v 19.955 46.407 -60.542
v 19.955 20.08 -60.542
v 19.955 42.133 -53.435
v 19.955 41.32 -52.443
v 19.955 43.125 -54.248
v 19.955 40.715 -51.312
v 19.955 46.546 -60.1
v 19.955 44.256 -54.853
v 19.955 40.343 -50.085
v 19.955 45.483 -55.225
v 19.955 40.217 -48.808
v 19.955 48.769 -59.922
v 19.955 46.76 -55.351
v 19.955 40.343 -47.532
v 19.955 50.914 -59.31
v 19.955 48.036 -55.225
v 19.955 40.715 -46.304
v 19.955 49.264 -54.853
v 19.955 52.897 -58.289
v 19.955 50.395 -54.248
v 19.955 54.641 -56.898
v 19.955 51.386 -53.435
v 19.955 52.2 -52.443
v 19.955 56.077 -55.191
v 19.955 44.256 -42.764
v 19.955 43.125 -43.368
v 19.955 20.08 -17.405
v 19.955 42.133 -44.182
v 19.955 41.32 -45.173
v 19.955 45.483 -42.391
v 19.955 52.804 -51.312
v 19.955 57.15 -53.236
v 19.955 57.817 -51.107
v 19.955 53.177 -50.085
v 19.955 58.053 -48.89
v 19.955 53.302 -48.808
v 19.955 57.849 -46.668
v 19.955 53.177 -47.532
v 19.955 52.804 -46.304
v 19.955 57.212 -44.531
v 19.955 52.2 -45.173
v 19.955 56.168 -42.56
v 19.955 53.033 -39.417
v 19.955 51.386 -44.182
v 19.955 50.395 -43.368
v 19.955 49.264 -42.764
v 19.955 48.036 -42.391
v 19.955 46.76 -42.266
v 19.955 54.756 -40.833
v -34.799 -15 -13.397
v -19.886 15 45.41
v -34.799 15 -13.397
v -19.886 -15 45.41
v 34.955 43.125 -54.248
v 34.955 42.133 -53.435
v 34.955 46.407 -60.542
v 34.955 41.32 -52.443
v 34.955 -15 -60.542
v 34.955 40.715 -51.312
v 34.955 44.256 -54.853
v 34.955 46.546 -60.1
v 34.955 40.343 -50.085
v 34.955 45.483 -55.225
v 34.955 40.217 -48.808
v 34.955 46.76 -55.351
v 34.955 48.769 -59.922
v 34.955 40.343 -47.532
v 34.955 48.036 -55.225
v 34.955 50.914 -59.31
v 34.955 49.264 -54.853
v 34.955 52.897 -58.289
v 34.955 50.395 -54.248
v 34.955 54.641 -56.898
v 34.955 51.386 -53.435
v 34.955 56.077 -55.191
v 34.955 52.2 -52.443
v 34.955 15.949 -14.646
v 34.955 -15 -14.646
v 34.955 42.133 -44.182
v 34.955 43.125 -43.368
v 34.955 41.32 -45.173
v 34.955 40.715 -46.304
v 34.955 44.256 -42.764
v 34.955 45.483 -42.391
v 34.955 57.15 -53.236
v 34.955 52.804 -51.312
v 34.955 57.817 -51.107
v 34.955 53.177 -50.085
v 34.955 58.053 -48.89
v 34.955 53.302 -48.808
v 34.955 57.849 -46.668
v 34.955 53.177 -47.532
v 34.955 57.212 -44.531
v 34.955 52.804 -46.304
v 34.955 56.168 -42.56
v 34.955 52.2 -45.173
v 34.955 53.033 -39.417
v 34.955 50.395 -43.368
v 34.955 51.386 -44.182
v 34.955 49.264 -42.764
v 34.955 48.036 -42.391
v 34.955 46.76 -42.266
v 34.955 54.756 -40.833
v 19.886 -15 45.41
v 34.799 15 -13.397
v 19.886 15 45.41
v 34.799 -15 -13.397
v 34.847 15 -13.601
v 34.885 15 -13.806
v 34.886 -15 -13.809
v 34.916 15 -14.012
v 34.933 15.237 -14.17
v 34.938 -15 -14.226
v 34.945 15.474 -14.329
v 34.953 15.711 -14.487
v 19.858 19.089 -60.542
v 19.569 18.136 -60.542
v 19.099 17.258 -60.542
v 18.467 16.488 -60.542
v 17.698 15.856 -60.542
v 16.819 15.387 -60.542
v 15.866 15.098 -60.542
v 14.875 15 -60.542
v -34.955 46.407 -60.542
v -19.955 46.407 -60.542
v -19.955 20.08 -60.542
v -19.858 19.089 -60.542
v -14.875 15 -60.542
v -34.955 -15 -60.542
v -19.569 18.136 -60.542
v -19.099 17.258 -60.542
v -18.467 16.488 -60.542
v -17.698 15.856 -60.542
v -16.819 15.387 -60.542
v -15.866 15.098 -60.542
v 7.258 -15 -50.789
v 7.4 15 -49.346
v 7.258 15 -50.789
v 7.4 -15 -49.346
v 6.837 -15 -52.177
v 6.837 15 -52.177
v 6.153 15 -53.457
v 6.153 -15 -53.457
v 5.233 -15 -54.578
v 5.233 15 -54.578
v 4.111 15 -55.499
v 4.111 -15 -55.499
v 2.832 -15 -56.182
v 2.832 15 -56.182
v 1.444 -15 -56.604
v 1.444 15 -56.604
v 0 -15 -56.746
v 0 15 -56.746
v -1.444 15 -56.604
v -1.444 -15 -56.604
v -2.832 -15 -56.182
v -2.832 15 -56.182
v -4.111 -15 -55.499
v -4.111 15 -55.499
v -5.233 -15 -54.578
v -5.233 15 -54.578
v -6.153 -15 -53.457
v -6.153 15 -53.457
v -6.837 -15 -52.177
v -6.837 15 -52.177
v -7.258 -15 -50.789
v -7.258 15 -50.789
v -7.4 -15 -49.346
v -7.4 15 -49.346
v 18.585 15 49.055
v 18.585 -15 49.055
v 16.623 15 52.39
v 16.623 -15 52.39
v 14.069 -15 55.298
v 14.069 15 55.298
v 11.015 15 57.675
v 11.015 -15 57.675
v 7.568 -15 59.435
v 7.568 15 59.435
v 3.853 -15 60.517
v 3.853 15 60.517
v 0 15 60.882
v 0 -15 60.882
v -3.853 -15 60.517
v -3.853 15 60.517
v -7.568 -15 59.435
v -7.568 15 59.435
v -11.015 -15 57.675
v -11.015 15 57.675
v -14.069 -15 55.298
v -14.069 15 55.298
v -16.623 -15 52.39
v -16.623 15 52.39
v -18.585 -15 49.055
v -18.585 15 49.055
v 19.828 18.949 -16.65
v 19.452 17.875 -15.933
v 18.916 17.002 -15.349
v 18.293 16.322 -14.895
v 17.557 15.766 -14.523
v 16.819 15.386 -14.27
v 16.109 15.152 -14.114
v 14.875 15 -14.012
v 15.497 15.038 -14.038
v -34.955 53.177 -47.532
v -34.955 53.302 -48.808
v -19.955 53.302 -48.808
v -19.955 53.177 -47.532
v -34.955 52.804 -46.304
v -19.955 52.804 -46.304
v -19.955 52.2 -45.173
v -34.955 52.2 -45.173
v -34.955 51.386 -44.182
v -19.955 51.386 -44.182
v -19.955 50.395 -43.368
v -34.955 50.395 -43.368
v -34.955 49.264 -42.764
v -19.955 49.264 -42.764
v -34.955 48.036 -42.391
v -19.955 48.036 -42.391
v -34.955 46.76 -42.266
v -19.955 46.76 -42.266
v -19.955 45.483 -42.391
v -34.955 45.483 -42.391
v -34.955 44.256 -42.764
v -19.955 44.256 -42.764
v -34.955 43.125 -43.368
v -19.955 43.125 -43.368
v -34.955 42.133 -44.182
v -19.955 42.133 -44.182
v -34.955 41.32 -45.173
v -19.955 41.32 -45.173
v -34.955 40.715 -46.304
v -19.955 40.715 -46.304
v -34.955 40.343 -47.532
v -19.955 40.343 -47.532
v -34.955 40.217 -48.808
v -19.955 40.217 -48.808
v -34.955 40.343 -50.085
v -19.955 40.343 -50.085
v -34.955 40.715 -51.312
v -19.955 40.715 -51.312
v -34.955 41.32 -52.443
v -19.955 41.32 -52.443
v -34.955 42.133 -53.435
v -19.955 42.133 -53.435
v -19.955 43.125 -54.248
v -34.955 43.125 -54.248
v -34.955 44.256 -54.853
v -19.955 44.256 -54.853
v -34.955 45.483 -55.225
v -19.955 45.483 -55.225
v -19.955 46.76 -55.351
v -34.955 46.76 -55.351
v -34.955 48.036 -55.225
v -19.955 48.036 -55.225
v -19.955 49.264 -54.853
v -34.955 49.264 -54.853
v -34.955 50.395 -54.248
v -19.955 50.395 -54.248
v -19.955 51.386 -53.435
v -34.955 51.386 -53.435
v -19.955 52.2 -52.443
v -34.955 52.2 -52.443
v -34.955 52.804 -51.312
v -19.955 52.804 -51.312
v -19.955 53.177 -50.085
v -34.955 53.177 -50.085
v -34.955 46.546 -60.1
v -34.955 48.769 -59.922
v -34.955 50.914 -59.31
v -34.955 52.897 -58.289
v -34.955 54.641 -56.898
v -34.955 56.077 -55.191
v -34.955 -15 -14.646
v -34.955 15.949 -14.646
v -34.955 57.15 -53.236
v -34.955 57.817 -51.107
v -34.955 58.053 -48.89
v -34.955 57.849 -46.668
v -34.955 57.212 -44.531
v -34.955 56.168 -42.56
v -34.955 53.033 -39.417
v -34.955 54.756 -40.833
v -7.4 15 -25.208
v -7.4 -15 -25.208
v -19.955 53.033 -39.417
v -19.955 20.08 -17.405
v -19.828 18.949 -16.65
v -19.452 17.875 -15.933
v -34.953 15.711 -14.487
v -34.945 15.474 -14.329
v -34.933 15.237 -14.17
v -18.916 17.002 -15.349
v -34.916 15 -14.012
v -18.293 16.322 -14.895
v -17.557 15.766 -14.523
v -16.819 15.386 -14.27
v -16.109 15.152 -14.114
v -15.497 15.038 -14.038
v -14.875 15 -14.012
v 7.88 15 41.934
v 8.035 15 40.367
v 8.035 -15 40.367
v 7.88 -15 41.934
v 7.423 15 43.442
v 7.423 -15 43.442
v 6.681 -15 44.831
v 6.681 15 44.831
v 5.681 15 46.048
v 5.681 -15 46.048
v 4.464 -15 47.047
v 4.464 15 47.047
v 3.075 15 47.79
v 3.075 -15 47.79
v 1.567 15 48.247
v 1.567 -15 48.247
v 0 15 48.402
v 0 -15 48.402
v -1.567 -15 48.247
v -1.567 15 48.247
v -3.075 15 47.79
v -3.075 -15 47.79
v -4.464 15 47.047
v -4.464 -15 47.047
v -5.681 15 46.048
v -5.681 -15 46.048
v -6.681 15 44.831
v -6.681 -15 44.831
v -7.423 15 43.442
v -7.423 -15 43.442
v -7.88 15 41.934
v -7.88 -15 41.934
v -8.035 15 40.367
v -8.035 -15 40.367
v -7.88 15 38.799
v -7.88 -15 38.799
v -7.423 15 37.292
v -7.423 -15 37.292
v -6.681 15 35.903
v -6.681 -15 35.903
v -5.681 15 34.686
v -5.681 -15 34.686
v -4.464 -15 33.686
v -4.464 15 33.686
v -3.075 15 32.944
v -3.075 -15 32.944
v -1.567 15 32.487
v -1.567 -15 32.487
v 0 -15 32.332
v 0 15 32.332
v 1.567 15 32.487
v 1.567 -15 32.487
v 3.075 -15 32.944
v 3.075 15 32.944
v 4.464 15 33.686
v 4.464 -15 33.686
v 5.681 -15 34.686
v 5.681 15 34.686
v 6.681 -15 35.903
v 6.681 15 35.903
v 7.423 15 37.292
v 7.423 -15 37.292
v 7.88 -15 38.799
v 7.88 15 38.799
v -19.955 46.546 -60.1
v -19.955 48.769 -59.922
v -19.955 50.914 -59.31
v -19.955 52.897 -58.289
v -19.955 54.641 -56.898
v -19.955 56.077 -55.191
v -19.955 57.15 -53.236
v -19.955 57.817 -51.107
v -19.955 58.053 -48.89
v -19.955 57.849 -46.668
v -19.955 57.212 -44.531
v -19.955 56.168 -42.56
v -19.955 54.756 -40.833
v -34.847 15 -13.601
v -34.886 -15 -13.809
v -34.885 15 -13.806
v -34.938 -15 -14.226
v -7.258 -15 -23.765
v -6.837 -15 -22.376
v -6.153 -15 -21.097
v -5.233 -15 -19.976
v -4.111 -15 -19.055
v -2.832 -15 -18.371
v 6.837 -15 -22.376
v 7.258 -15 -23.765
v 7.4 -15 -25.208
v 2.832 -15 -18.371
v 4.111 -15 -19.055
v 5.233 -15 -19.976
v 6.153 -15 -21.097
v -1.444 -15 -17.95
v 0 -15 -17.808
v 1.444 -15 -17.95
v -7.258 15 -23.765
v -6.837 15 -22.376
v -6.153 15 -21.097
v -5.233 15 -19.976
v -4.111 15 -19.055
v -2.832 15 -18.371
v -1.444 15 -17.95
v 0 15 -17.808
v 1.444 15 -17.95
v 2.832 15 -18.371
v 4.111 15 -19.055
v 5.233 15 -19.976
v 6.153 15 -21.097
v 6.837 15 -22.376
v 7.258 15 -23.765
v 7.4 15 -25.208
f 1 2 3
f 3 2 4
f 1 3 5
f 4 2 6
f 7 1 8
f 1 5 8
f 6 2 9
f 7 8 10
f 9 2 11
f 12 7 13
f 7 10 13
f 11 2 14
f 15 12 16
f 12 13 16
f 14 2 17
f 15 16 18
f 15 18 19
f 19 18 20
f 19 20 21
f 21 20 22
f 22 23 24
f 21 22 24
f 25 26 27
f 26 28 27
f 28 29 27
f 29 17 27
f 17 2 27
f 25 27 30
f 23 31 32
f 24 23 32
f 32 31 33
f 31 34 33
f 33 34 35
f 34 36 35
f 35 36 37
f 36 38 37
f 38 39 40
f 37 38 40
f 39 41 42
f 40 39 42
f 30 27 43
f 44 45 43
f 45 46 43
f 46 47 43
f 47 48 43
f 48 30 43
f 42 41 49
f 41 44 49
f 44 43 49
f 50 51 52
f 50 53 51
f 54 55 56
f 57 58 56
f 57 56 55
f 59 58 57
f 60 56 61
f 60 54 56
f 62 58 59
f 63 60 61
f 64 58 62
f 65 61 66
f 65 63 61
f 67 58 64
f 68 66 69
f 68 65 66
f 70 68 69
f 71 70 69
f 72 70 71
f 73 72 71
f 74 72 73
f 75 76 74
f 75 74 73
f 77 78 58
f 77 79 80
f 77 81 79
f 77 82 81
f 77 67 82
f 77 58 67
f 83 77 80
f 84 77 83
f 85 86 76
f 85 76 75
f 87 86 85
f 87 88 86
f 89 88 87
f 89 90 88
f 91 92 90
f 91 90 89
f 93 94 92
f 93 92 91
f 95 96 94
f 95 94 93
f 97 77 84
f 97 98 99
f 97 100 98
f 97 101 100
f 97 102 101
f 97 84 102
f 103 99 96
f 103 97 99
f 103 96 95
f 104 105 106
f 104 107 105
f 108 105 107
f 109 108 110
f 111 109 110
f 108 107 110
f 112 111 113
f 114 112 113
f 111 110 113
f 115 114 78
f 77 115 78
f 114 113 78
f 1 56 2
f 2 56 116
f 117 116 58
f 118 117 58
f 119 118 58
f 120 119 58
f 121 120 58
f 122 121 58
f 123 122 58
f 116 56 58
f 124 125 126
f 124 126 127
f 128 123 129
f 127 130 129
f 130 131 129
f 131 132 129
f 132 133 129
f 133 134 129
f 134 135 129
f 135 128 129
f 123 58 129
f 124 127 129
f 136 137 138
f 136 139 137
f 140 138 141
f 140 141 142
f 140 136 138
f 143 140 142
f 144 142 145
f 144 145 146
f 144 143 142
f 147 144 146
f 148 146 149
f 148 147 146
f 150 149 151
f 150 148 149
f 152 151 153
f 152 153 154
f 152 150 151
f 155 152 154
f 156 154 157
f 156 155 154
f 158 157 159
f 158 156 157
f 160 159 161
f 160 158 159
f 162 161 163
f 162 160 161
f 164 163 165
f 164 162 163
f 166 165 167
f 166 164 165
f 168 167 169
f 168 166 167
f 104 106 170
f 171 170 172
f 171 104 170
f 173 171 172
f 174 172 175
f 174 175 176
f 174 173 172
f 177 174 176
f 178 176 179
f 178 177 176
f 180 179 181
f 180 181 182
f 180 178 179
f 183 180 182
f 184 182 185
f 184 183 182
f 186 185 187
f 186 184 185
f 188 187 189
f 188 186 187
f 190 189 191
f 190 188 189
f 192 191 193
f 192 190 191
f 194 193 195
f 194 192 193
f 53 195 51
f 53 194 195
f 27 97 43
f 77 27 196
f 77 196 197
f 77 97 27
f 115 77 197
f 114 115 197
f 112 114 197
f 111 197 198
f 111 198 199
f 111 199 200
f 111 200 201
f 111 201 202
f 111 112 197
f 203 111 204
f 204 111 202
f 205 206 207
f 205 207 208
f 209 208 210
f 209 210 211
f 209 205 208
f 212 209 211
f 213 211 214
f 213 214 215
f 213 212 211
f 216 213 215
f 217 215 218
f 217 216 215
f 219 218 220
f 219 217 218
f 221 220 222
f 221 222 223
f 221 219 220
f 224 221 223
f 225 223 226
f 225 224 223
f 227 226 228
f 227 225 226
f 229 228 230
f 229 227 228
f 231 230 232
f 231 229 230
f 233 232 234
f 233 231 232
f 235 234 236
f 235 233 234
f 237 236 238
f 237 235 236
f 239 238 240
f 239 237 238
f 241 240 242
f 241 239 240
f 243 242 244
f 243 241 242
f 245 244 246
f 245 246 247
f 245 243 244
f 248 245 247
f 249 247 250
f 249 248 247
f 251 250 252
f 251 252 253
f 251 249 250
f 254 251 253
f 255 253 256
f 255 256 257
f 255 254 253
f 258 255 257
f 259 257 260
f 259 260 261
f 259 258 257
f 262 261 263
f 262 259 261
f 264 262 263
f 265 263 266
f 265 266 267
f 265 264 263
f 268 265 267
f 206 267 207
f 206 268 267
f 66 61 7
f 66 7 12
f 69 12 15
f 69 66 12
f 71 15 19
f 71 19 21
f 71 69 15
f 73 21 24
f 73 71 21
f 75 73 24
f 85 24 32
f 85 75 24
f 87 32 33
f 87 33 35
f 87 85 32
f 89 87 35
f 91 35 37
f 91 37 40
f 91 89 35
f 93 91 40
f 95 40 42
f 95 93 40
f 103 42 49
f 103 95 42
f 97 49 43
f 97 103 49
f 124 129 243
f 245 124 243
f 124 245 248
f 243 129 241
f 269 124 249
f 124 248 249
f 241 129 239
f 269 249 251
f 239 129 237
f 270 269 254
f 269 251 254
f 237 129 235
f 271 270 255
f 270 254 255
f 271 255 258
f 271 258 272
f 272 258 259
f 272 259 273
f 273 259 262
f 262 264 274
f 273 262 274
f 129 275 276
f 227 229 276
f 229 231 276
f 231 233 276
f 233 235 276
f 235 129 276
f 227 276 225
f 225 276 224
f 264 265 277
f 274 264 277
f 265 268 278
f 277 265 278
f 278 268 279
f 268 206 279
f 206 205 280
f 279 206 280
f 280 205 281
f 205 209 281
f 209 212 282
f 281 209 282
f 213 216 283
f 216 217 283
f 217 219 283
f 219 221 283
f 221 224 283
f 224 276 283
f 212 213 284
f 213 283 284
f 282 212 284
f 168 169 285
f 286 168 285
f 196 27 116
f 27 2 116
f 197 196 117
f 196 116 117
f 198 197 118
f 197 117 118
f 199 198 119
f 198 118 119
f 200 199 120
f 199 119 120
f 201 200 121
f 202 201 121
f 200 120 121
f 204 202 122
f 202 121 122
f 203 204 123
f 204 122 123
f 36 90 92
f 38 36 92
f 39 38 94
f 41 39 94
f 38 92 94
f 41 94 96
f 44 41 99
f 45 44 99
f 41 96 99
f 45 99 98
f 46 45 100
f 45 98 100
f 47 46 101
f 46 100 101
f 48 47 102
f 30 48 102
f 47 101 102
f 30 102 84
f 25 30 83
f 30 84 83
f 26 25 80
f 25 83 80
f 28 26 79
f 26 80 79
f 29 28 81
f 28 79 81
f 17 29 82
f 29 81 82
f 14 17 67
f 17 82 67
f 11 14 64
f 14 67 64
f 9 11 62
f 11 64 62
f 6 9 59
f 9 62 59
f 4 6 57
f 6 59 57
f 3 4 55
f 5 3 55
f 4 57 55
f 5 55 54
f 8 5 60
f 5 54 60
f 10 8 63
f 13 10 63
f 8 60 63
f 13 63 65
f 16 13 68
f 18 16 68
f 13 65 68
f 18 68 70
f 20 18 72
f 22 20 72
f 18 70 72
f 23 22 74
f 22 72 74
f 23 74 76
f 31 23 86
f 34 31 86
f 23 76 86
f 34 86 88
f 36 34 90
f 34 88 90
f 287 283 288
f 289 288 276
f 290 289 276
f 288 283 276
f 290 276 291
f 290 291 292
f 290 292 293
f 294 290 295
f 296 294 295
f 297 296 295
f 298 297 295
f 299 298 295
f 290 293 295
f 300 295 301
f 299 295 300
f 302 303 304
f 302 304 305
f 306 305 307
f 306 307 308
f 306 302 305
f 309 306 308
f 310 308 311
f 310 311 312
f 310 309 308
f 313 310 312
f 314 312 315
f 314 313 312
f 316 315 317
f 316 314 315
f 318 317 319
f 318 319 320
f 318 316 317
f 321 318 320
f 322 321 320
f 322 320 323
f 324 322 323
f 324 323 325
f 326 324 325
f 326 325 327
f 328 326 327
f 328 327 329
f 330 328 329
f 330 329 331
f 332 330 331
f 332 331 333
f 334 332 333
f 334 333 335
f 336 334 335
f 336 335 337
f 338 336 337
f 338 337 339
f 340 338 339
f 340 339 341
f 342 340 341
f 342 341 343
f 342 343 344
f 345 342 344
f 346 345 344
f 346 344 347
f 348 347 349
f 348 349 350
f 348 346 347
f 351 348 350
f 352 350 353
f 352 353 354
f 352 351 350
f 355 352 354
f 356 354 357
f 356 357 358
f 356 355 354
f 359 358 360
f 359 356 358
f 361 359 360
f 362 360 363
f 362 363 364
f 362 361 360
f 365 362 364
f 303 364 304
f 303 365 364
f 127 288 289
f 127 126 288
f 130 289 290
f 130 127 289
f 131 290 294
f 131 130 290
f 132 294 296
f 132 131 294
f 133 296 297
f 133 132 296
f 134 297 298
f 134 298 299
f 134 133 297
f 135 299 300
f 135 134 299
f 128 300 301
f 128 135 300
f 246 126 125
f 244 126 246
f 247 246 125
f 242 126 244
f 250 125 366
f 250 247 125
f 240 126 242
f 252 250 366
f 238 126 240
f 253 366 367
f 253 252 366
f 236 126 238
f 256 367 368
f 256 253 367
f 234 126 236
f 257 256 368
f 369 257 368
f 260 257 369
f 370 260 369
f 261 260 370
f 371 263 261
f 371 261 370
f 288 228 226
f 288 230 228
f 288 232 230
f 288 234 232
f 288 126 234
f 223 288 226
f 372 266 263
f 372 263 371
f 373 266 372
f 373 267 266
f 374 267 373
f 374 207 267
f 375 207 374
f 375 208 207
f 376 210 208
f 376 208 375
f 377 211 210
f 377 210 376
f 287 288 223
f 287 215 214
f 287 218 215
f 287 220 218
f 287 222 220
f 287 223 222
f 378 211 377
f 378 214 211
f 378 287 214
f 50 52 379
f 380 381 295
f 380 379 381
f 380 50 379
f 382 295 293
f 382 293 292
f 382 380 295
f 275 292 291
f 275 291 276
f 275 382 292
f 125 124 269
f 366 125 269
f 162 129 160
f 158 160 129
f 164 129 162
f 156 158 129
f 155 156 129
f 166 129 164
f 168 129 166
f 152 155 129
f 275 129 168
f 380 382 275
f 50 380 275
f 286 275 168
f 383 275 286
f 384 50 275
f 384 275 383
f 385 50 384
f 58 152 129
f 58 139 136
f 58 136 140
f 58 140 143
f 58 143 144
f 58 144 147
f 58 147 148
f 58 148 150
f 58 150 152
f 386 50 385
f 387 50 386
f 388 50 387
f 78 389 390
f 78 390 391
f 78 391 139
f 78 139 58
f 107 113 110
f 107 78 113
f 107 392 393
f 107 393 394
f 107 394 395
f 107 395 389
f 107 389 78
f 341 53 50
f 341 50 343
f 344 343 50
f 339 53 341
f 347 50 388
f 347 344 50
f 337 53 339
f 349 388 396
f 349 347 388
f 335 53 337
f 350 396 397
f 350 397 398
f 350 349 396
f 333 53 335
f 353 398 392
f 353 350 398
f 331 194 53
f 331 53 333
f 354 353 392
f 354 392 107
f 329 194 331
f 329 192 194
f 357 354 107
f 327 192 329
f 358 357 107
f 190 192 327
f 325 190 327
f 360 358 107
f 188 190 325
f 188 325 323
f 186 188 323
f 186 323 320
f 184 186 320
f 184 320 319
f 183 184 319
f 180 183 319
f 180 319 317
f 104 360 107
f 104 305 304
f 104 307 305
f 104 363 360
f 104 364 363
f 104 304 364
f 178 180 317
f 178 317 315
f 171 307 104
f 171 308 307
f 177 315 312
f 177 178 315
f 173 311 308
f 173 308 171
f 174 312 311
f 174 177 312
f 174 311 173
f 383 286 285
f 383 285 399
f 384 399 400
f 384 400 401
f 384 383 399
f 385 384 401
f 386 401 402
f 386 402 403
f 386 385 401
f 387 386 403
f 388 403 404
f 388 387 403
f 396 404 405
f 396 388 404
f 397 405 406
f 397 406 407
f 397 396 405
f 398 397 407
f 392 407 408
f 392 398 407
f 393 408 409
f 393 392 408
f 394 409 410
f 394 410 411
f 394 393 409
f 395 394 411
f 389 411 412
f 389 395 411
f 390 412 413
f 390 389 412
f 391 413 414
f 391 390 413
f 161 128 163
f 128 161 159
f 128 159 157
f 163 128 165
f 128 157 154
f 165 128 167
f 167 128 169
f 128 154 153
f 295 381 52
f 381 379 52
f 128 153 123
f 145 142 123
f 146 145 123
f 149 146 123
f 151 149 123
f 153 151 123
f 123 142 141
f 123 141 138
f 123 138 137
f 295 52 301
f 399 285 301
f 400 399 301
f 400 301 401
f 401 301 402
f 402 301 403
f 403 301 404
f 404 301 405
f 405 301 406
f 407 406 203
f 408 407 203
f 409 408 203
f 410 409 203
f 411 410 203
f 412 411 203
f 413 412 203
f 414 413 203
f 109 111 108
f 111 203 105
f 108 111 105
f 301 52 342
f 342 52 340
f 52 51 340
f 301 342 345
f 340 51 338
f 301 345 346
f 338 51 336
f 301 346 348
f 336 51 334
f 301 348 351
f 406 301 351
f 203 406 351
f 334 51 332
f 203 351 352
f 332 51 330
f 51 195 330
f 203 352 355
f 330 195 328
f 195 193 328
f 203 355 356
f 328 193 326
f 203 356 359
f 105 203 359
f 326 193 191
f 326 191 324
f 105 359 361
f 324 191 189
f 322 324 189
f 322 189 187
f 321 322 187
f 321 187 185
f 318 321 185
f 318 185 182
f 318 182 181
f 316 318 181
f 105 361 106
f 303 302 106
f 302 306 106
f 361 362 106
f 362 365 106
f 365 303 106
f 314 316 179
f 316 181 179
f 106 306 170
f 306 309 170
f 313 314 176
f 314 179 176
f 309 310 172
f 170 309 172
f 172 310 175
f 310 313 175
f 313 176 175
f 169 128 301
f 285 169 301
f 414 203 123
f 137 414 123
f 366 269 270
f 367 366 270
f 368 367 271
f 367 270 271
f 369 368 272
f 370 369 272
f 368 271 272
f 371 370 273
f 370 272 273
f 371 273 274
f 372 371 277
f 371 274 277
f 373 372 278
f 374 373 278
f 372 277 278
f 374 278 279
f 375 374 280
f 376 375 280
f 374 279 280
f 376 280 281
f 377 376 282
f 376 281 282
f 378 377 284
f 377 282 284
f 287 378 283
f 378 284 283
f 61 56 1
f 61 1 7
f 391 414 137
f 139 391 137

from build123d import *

# Parameters (mm, degrees)
F0_R     = 8.034582
F1_DEPTH = 15
F2_R     = 6.54267
F3_DEPTH = 15
F4_R     = 5.08


with BuildPart() as f1:
    # F0 (on Front) → F1 (new body, symmetric)
    with BuildSketch(Plane.XZ):
        with BuildLine():
            Line((-34.955353, -60.541797), (34.955353, -60.541797))
            Line((34.955353, -60.541797), (34.955353, -14.012067))
            Line((34.955353, -14.012067), (19.885809, 45.410026))
            ThreePointArc((19.885809, 45.410026), (0, 60.882263), (-19.885809, 45.410026))
            Line((-19.885809, 45.410026), (-34.955353, -14.012067))
            Line((-34.955353, -14.012067), (-34.955353, -60.541797))
        make_face()
        with BuildLine():
            ThreePointArc((-7.400118, -25.208272), (0, -17.808154), (7.400118, -25.208272))
            Line((7.400118, -25.208272), (7.400118, -49.345592))
            ThreePointArc((7.400118, -49.345592), (0, -56.74571), (-7.400118, -49.345592))
            Line((-7.400118, -49.345592), (-7.400118, -25.208272))
        make_face(mode=Mode.SUBTRACT)
        with Locations((0, 40.366952)):
            Circle(F0_R, mode=Mode.SUBTRACT)
    extrude(amount=F1_DEPTH, both=True)

    # F2 (on face) → F3 (join)
    with BuildSketch(Plane.YZ.offset(34.955353)):
        with BuildLine():
            Line((53.032903, -39.416735), (15, -14.012067))
            Line((15, -14.012067), (15, -60.541797))
            Line((15, -60.541797), (46.407126, -60.541797))
            Line((46.407126, -60.541797), (46.545673, -60.100067))
            ThreePointArc((46.545673, -60.100067), (57.536015, -52.188126), (53.032903, -39.416735))
        make_face()
        with Locations((46.759732, -48.808195)):
            Circle(F2_R, mode=Mode.SUBTRACT)
    extrude(amount=-F3_DEPTH)

    # F4
    f4_edges = [f1.edges().sort_by_distance(p)[0] for p in [
        (19.955353, 15, -37.276932),
        (-34.955353, 0, -14.012067),
        (34.955353, 0, -14.012067),
    ]]
    fillet(f4_edges, radius=F4_R)

    # F5: F1 across plane


with BuildPart() as f1_1:
    add(f1.part)
    add(f1.part.mirror(Plane.YZ))


solid = f1_1.part
